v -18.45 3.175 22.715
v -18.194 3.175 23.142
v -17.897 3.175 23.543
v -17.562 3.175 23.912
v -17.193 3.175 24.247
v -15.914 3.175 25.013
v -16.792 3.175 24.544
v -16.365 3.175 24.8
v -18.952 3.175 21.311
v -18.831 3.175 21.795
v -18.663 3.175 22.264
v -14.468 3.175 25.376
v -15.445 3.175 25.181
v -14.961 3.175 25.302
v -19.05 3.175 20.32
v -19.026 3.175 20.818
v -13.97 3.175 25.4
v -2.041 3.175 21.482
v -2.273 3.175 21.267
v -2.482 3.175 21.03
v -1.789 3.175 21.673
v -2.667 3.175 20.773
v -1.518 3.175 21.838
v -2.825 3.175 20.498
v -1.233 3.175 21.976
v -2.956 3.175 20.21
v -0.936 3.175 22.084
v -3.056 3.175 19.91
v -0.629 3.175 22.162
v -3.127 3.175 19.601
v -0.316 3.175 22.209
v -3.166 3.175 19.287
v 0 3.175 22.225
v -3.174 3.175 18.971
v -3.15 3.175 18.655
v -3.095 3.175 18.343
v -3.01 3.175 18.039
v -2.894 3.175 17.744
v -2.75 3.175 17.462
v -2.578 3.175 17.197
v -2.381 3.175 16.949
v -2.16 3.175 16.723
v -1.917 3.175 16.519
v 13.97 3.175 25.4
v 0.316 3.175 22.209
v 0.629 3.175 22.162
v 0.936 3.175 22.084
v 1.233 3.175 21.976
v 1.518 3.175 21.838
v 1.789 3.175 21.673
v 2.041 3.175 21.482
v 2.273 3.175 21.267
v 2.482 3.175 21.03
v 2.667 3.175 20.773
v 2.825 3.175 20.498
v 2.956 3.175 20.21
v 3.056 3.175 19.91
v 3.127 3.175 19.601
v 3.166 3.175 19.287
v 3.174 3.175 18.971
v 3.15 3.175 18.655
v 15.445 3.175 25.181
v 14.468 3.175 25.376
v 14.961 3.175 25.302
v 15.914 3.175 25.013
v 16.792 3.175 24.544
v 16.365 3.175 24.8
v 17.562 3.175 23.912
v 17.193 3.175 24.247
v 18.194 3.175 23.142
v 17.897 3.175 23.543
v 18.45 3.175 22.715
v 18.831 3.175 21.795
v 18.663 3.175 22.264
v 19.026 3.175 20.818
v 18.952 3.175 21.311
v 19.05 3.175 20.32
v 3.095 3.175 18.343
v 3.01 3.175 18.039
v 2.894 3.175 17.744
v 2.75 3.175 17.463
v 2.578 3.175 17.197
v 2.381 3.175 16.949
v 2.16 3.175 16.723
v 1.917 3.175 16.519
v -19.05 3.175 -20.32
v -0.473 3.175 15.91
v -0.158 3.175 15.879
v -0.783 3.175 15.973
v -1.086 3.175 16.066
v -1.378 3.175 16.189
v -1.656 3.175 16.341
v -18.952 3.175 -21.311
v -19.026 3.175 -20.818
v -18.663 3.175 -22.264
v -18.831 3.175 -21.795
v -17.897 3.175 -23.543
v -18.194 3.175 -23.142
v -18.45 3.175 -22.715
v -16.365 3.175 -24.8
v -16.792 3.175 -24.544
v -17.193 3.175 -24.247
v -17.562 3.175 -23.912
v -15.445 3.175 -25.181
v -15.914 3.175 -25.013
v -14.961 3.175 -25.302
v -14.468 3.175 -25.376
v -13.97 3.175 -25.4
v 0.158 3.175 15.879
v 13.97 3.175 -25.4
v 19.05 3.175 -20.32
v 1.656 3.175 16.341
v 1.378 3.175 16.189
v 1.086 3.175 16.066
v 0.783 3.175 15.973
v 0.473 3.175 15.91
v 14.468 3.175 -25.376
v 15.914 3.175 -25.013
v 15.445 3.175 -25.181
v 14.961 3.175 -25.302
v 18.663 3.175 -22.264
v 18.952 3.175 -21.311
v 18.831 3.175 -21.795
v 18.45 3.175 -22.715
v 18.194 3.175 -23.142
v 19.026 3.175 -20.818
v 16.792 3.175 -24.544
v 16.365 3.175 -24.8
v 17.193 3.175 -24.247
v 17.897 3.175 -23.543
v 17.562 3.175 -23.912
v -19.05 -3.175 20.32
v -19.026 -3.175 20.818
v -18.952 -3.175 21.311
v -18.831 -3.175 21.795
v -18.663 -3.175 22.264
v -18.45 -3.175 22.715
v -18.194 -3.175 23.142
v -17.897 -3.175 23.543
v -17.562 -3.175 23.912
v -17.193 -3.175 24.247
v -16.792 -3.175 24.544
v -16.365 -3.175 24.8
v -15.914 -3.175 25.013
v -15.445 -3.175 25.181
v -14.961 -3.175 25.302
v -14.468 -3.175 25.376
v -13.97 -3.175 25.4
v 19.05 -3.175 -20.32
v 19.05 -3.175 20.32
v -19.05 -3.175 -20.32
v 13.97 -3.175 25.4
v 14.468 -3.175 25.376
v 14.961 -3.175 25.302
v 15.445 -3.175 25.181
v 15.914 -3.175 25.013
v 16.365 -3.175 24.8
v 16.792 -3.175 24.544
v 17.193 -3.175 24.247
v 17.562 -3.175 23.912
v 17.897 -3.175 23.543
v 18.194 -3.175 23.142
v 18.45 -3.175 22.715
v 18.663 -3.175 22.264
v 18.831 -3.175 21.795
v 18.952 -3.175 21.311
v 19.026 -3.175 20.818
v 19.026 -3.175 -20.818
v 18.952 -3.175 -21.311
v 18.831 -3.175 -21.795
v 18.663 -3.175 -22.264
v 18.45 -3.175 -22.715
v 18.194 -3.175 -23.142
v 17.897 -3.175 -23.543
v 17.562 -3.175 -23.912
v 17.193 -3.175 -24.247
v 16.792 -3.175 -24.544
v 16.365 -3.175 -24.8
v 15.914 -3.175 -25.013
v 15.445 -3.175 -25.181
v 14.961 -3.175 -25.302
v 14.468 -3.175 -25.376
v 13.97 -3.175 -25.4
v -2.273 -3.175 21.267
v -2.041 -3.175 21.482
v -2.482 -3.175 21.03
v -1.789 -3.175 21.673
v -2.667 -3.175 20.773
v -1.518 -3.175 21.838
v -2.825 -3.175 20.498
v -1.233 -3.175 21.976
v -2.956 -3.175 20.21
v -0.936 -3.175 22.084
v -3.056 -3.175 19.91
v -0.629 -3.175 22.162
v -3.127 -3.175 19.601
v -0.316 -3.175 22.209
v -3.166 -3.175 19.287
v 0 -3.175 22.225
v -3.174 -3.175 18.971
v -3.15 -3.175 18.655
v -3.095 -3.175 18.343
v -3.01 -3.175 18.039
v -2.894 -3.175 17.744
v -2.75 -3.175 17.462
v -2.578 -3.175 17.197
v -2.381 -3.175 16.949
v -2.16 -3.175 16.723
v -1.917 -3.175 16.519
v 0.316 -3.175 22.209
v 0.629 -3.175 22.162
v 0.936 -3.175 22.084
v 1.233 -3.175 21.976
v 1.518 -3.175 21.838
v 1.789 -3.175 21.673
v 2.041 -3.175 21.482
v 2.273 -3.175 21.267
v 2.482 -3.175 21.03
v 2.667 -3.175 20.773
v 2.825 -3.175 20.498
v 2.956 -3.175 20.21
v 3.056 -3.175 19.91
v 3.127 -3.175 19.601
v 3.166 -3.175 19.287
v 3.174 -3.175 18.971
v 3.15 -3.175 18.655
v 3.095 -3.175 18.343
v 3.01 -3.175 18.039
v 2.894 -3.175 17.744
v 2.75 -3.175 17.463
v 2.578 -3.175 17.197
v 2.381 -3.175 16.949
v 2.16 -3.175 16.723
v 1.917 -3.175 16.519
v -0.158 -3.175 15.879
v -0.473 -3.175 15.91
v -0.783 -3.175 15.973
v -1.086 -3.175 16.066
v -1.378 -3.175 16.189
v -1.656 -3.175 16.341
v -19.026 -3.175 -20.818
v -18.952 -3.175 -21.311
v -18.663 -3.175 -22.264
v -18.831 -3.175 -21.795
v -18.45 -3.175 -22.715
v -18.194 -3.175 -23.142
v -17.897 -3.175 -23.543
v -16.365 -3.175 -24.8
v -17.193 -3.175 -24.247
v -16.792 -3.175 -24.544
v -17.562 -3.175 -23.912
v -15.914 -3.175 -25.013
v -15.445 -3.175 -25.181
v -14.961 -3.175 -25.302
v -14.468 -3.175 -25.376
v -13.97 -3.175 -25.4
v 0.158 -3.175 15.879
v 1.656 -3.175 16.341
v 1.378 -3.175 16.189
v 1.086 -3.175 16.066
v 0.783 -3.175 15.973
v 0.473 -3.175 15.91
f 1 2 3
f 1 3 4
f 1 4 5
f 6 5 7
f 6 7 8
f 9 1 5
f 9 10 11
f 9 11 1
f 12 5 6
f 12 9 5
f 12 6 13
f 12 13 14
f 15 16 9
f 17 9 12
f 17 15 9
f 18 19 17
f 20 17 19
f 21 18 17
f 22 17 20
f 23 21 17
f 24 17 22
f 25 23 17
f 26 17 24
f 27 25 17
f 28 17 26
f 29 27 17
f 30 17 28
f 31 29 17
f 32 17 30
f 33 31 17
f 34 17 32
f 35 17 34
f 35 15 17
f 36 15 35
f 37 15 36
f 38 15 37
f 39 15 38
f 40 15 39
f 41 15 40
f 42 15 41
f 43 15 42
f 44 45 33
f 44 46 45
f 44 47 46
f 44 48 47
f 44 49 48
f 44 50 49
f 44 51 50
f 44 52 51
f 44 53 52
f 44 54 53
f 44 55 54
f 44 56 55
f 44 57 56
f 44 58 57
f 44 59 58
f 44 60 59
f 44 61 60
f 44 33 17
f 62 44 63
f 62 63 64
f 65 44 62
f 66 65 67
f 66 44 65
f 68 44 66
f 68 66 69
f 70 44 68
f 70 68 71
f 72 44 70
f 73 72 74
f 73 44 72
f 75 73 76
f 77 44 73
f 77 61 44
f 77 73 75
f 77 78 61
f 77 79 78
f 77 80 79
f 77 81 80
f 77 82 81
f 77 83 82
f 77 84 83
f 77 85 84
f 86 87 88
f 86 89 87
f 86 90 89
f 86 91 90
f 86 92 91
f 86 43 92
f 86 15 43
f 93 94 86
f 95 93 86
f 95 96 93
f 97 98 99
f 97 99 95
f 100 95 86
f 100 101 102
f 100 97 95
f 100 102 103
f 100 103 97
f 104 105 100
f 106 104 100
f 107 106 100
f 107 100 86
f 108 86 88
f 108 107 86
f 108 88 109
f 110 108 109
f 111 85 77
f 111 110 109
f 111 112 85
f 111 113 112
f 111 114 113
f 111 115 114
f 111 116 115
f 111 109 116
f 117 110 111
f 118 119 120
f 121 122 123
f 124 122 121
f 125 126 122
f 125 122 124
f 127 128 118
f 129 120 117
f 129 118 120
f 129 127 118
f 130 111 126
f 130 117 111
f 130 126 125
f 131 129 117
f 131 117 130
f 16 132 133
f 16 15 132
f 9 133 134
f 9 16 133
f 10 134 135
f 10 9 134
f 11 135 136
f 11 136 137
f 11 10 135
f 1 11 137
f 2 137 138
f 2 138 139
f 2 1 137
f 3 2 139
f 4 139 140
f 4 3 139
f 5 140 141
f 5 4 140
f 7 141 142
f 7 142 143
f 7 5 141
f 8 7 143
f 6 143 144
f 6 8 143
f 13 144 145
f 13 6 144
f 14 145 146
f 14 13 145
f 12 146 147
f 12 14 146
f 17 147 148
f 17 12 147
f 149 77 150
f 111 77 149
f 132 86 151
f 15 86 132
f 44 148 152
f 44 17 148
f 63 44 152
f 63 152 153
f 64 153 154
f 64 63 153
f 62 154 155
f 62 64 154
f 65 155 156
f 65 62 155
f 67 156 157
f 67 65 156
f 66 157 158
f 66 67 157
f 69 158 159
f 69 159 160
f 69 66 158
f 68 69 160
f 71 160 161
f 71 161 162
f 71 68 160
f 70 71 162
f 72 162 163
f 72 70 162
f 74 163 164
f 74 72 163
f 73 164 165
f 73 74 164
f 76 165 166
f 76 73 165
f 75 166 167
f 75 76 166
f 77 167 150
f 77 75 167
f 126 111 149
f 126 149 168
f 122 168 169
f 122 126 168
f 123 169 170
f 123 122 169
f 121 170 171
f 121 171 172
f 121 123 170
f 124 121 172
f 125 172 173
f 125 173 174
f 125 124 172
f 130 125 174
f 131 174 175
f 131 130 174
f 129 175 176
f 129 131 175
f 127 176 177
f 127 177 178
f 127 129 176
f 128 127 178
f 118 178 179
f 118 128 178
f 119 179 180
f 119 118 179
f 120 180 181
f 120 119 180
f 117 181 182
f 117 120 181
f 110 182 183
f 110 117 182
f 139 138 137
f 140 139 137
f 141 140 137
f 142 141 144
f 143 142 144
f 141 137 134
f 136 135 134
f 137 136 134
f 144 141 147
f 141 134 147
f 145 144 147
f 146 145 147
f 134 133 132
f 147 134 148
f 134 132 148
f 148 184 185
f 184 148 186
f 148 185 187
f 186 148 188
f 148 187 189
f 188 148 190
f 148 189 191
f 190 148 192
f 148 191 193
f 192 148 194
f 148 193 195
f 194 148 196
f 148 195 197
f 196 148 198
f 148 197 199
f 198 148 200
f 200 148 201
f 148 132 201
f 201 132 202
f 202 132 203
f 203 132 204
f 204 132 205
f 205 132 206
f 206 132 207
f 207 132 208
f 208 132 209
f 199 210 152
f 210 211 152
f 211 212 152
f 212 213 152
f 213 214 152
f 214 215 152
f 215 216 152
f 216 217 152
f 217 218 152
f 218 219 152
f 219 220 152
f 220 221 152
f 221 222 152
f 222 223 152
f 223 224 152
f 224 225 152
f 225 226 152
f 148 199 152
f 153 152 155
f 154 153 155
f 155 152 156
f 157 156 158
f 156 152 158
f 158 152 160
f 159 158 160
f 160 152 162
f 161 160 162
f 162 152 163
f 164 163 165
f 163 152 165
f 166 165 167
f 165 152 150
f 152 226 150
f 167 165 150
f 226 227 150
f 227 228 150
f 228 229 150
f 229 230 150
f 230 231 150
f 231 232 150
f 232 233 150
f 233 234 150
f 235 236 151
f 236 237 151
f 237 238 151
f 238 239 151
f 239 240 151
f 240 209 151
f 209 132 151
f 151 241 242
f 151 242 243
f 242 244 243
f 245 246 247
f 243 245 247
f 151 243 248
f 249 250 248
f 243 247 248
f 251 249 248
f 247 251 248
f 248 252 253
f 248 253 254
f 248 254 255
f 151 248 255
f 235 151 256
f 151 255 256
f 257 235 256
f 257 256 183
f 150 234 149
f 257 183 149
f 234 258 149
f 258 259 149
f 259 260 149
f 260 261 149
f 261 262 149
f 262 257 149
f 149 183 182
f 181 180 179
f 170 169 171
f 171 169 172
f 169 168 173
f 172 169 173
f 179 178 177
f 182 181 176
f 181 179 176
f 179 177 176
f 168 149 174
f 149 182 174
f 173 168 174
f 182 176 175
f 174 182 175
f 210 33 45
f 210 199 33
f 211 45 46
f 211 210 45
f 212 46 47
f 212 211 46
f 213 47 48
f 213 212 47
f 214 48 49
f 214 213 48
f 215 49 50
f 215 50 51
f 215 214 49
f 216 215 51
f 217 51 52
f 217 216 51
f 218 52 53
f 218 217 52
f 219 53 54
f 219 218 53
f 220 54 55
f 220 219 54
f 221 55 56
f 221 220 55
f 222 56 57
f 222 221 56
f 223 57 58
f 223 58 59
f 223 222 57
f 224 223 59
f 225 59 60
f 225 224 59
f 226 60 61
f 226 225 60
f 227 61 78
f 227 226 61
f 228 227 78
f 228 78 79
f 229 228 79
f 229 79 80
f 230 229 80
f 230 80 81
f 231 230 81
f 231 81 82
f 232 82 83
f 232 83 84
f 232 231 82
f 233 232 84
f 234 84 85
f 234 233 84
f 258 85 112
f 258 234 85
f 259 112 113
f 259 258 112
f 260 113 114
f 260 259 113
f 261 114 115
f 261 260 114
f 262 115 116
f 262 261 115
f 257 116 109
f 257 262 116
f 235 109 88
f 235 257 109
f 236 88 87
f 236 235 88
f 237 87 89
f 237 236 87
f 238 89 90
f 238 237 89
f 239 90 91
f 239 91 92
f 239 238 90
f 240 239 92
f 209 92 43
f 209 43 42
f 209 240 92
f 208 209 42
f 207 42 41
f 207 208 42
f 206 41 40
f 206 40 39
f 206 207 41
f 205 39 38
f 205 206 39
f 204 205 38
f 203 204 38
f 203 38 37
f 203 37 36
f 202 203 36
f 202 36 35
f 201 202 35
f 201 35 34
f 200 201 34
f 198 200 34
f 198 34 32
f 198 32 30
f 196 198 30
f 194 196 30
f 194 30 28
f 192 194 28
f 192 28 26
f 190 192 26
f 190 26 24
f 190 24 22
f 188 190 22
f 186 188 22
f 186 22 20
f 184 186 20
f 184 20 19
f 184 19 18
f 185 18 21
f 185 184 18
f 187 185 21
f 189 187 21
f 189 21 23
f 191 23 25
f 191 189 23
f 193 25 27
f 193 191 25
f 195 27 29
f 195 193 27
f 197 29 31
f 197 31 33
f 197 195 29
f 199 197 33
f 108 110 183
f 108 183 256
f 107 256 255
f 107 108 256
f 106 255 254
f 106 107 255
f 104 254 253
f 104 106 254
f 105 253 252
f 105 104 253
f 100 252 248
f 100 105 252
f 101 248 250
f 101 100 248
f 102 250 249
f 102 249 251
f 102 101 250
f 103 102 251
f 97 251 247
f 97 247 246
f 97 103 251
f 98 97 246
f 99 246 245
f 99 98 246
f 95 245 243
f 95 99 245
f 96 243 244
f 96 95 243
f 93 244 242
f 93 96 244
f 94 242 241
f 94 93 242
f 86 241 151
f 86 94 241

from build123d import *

# Parameters (mm, degrees)
SKETCH2_R           = 3.175
BOSS_EXTRUDE1_DEPTH = 3.175


with BuildPart() as part:
    # Sketch2 → Boss-Extrude1 (new, symmetric)
    with BuildSketch(Plane(origin=(0, 0, 0), x_dir=(1, 0, 0), z_dir=(0, 1, 0))):
        with BuildLine():
            Line((-13.97, -25.4), (13.97, -25.4))
            ThreePointArc((13.97, -25.4), (17.562102448, -23.912102448), (19.05, -20.32))
            Line((19.05, -20.32), (19.05, 20.32))
            ThreePointArc((19.05, 20.32), (17.562102448, 23.912102448), (13.97, 25.4))
            Line((13.97, 25.4), (-13.97, 25.4))
            ThreePointArc((-13.97, 25.4), (-17.562102448, 23.912102448), (-19.05, 20.32))
            Line((-19.05, 20.32), (-19.05, -20.32))
            ThreePointArc((-19.05, -20.32), (-17.562102448, -23.912102448), (-13.97, -25.4))
        make_face()
        with Locations(Location((0, -19.05, 0), (0, 0, 270))):
            Circle(SKETCH2_R, mode=Mode.SUBTRACT)
    extrude(amount=BOSS_EXTRUDE1_DEPTH, both=True)


solid = part.part
